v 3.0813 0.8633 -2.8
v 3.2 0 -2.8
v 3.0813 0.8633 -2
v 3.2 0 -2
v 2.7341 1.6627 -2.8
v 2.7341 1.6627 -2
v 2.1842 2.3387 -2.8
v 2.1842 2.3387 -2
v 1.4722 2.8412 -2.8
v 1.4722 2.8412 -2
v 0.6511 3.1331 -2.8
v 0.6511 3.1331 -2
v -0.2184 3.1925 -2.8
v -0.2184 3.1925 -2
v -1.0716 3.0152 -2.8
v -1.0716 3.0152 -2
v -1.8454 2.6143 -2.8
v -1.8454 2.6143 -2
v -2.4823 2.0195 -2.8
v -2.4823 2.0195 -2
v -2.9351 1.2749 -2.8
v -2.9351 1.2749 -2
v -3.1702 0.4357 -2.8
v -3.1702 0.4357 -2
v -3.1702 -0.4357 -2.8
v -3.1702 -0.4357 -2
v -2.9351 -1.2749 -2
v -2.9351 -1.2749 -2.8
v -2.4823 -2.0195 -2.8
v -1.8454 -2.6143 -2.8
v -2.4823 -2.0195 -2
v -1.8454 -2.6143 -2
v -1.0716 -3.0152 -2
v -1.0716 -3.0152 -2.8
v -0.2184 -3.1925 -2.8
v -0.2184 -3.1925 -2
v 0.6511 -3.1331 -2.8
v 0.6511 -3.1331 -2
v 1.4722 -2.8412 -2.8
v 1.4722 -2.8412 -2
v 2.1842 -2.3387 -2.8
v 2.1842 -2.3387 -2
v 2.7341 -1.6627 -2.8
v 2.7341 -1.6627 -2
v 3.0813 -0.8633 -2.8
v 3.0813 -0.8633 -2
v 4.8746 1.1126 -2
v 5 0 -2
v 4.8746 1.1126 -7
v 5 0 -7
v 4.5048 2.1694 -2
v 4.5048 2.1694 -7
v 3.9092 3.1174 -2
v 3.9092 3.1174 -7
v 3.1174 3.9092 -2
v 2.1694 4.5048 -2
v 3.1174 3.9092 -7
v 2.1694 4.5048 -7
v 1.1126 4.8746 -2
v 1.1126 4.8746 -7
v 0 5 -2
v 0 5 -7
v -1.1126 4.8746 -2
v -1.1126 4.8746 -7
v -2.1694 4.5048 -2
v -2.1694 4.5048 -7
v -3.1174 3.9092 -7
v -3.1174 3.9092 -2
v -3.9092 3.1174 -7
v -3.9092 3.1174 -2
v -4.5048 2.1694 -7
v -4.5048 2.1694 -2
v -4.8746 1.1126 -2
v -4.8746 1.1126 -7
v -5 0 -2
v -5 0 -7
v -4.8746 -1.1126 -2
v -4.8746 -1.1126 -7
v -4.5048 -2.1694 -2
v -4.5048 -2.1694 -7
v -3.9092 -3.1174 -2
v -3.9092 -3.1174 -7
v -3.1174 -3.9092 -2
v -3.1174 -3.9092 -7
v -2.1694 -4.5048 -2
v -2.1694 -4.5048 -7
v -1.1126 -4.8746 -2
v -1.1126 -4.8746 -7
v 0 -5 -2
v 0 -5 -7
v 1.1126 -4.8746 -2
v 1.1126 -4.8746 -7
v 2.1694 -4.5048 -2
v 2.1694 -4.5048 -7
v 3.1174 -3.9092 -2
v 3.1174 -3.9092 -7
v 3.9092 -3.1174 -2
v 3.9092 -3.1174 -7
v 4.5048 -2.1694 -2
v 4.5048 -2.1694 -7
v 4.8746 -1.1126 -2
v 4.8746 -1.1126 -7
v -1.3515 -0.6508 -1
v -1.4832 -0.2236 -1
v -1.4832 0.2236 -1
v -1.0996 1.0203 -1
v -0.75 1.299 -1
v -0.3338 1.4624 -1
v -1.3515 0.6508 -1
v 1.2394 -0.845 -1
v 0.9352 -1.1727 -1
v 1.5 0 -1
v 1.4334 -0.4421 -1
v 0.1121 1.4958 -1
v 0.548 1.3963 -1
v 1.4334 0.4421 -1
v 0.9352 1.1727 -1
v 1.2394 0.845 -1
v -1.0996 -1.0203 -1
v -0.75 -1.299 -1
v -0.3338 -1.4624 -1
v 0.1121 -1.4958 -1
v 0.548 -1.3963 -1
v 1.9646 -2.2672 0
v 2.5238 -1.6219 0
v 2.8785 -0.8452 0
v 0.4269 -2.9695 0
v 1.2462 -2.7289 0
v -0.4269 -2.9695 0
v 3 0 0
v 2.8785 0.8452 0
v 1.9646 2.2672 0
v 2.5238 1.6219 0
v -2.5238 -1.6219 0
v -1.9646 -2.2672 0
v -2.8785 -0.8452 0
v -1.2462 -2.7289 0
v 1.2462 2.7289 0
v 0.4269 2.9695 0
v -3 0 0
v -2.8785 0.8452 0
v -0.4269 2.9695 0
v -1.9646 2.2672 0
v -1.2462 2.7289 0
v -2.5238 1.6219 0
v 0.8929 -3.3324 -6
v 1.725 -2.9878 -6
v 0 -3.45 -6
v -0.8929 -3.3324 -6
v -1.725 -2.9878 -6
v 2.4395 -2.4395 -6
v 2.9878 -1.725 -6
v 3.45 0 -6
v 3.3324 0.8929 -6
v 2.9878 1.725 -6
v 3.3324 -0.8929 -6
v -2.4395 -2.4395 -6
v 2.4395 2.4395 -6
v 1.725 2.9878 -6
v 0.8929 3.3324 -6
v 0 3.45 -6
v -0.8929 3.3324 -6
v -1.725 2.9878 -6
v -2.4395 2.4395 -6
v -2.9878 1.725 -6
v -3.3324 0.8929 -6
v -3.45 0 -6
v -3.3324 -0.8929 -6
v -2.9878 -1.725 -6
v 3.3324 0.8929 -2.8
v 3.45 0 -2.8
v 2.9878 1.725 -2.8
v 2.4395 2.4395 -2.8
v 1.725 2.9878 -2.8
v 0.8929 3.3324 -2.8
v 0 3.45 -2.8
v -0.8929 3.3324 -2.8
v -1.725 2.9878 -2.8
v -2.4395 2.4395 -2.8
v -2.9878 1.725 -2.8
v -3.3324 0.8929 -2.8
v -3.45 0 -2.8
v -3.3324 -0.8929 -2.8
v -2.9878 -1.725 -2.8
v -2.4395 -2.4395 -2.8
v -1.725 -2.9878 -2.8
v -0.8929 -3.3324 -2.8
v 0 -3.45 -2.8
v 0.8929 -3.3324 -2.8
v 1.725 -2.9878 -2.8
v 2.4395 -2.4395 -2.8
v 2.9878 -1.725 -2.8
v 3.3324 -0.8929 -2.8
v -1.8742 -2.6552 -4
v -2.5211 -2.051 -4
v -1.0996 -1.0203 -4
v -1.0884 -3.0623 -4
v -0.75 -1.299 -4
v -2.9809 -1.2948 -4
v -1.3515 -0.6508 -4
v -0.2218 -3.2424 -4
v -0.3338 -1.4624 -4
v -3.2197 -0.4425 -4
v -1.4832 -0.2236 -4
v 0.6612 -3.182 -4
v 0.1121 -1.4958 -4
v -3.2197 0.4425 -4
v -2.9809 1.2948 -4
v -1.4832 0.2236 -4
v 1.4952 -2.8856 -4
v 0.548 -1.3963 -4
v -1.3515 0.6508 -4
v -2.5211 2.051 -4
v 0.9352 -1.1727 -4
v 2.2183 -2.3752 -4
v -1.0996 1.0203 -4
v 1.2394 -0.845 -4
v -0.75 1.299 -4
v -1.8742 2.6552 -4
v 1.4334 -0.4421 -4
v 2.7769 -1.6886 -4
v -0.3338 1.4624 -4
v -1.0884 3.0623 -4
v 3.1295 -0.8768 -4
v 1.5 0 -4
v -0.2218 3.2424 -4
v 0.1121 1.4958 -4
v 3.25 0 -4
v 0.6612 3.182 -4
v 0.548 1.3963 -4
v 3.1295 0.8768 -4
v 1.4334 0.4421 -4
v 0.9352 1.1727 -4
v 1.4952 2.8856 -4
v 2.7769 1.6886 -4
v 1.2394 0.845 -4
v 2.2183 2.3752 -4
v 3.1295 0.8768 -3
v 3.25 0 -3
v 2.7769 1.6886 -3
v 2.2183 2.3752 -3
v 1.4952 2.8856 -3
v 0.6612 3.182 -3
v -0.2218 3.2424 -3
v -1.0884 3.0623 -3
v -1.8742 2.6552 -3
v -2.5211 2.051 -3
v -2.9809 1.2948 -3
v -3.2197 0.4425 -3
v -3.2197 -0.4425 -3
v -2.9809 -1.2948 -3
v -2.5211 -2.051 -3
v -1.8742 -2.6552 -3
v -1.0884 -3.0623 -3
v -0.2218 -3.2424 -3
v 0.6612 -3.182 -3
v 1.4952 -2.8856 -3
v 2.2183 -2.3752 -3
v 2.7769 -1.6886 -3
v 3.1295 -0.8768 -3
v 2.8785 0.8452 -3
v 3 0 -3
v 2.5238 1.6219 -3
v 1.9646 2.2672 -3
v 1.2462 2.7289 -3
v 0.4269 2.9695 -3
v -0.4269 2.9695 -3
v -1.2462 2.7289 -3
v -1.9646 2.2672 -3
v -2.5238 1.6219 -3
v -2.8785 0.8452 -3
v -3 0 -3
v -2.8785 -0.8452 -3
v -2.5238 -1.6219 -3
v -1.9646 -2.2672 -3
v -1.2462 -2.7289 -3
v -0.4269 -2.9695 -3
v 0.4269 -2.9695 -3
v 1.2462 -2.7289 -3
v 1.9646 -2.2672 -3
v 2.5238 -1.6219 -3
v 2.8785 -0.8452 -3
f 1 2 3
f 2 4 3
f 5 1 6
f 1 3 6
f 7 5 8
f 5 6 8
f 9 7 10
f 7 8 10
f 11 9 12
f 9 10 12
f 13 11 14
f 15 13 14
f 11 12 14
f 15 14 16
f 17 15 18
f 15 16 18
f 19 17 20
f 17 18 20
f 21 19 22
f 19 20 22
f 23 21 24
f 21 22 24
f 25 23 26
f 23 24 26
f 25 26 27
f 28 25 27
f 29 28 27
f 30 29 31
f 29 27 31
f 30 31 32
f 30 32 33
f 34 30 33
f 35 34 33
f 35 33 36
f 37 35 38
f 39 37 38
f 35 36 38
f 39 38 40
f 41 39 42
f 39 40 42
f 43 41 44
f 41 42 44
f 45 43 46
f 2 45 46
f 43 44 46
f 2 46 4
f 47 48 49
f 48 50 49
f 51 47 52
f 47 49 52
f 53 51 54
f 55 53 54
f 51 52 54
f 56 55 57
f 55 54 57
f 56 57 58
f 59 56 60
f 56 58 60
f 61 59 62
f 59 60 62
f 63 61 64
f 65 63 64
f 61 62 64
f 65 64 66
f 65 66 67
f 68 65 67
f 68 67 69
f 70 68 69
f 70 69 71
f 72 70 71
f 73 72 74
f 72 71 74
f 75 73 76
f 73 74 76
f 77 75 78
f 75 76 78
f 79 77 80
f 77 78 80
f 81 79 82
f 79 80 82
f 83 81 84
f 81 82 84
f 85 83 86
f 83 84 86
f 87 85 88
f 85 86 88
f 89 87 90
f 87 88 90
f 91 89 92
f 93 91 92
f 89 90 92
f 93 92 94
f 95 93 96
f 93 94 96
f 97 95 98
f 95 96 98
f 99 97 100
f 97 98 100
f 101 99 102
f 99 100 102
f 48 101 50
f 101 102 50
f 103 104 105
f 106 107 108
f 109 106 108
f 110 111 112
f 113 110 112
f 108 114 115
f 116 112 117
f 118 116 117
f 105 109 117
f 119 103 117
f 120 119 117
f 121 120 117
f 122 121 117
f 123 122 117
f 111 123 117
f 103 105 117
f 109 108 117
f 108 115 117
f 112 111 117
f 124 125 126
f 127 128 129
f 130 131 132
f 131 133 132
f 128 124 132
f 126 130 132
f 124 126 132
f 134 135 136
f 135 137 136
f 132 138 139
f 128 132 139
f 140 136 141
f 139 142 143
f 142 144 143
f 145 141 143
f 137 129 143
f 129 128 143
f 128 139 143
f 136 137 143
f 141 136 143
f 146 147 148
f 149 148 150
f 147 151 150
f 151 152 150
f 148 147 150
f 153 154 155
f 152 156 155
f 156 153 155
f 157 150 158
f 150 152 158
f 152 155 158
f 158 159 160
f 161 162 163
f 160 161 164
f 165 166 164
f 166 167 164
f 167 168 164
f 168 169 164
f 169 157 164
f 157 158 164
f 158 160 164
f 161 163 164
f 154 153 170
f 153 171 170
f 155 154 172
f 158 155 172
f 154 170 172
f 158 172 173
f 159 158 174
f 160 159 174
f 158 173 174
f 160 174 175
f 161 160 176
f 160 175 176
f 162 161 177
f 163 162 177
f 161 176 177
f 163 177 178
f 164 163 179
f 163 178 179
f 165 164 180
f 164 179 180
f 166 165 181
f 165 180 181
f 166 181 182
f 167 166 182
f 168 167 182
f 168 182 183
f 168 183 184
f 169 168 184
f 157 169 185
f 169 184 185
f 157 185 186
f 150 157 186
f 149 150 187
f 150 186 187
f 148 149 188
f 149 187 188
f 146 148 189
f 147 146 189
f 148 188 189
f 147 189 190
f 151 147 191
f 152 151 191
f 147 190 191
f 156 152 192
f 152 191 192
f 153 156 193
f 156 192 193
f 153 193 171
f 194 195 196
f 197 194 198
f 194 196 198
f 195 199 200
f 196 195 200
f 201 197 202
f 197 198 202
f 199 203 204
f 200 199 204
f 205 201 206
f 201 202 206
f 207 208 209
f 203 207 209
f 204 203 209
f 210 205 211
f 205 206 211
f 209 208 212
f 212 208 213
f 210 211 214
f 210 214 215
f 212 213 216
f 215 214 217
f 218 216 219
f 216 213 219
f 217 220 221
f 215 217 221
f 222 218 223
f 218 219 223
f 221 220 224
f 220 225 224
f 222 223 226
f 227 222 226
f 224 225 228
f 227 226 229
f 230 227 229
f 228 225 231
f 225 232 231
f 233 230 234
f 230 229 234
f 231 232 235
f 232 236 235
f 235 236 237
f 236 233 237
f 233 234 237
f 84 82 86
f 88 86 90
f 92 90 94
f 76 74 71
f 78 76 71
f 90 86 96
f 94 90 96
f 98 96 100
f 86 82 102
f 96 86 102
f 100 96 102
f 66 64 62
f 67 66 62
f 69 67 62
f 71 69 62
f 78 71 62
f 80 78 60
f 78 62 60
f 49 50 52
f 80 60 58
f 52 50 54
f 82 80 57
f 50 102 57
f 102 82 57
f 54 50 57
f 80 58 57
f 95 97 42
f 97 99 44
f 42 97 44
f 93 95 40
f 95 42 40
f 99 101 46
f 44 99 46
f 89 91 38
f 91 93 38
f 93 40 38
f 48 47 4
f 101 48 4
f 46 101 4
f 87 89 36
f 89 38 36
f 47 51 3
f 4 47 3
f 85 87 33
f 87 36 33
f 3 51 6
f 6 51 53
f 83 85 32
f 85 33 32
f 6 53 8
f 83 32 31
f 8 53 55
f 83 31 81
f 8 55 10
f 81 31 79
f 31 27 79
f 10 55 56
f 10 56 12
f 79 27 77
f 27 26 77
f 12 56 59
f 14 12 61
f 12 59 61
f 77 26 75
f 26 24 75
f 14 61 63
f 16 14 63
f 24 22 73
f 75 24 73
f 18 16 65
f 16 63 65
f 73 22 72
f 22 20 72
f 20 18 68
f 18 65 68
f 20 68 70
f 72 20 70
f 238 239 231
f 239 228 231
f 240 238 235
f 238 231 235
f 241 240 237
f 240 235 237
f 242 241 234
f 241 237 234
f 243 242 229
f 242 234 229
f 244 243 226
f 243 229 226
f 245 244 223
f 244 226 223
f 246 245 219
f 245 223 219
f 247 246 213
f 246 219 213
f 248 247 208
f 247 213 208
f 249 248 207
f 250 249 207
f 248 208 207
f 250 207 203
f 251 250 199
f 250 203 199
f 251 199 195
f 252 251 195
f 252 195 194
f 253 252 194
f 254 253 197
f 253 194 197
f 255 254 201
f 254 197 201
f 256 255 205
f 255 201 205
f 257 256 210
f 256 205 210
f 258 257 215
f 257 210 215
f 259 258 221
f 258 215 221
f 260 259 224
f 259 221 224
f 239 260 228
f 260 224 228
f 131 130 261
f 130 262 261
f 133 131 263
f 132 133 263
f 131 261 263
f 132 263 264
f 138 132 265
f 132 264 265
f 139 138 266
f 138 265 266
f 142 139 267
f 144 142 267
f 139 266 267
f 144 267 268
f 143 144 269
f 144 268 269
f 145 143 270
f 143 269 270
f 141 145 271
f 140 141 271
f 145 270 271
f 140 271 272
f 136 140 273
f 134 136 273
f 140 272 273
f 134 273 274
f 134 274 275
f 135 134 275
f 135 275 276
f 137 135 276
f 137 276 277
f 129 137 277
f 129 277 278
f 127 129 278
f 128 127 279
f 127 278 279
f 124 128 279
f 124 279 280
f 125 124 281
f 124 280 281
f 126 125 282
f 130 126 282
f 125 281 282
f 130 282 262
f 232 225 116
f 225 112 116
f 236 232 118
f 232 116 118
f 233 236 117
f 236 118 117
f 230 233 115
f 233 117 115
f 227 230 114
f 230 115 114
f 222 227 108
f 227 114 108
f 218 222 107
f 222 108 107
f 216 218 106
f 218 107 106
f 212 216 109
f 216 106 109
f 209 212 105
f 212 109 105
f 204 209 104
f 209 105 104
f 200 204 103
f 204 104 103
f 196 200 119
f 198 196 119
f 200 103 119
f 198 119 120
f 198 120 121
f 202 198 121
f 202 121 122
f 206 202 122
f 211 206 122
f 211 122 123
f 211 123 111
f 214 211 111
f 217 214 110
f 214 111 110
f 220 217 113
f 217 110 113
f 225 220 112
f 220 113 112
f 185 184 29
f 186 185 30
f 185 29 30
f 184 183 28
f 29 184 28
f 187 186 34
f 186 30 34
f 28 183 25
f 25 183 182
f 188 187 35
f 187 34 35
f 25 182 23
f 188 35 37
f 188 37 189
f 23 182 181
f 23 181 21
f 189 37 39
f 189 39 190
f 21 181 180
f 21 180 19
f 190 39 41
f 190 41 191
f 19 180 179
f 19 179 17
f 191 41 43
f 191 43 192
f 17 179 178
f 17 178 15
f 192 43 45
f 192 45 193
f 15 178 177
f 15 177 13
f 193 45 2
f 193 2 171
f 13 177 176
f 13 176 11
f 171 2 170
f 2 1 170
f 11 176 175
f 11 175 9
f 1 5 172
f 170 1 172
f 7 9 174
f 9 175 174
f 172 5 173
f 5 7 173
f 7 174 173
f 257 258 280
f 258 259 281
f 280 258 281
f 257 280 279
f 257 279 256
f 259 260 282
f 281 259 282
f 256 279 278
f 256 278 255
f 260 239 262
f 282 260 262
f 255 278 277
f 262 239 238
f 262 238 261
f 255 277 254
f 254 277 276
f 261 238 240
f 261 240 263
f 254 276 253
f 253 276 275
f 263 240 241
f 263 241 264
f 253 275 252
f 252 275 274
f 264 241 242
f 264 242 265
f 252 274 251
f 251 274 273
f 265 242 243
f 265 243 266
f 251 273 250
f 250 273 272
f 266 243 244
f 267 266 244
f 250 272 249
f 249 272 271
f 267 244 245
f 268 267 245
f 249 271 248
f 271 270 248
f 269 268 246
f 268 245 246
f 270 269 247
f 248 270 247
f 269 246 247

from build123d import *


with BuildPart() as part:
    # Sketch3 → Revolve3 (revolve)
    with BuildSketch(Plane(origin=(0, 0, 0), x_dir=(1, 0, 0), z_dir=(0, 1, 0))):
        Polygon((0, 1), (0, 0), (3, 0), (3, 3), (3.25, 3), (3.25, 4), (1.5, 4), (1.5, 1), align=None)
    revolve(axis=Axis((0, 0, 0), (0, 0, 1)))


with BuildPart() as body_2:
    # Sketch3<3> → Revolve4 (revolve)
    with BuildSketch(Plane(origin=(0, 0, 0), x_dir=(1, 0, 0), z_dir=(0, 1, 0))):
        Polygon((0, 7), (0, 6), (3.45, 6), (3.45, 2.8), (3.2, 2.8), (3.2, 2), (5, 2), (5, 7), align=None)
    revolve(axis=Axis((0, 0, 0), (0, 0, 1)))


solid = Compound([part.part, body_2.part])
